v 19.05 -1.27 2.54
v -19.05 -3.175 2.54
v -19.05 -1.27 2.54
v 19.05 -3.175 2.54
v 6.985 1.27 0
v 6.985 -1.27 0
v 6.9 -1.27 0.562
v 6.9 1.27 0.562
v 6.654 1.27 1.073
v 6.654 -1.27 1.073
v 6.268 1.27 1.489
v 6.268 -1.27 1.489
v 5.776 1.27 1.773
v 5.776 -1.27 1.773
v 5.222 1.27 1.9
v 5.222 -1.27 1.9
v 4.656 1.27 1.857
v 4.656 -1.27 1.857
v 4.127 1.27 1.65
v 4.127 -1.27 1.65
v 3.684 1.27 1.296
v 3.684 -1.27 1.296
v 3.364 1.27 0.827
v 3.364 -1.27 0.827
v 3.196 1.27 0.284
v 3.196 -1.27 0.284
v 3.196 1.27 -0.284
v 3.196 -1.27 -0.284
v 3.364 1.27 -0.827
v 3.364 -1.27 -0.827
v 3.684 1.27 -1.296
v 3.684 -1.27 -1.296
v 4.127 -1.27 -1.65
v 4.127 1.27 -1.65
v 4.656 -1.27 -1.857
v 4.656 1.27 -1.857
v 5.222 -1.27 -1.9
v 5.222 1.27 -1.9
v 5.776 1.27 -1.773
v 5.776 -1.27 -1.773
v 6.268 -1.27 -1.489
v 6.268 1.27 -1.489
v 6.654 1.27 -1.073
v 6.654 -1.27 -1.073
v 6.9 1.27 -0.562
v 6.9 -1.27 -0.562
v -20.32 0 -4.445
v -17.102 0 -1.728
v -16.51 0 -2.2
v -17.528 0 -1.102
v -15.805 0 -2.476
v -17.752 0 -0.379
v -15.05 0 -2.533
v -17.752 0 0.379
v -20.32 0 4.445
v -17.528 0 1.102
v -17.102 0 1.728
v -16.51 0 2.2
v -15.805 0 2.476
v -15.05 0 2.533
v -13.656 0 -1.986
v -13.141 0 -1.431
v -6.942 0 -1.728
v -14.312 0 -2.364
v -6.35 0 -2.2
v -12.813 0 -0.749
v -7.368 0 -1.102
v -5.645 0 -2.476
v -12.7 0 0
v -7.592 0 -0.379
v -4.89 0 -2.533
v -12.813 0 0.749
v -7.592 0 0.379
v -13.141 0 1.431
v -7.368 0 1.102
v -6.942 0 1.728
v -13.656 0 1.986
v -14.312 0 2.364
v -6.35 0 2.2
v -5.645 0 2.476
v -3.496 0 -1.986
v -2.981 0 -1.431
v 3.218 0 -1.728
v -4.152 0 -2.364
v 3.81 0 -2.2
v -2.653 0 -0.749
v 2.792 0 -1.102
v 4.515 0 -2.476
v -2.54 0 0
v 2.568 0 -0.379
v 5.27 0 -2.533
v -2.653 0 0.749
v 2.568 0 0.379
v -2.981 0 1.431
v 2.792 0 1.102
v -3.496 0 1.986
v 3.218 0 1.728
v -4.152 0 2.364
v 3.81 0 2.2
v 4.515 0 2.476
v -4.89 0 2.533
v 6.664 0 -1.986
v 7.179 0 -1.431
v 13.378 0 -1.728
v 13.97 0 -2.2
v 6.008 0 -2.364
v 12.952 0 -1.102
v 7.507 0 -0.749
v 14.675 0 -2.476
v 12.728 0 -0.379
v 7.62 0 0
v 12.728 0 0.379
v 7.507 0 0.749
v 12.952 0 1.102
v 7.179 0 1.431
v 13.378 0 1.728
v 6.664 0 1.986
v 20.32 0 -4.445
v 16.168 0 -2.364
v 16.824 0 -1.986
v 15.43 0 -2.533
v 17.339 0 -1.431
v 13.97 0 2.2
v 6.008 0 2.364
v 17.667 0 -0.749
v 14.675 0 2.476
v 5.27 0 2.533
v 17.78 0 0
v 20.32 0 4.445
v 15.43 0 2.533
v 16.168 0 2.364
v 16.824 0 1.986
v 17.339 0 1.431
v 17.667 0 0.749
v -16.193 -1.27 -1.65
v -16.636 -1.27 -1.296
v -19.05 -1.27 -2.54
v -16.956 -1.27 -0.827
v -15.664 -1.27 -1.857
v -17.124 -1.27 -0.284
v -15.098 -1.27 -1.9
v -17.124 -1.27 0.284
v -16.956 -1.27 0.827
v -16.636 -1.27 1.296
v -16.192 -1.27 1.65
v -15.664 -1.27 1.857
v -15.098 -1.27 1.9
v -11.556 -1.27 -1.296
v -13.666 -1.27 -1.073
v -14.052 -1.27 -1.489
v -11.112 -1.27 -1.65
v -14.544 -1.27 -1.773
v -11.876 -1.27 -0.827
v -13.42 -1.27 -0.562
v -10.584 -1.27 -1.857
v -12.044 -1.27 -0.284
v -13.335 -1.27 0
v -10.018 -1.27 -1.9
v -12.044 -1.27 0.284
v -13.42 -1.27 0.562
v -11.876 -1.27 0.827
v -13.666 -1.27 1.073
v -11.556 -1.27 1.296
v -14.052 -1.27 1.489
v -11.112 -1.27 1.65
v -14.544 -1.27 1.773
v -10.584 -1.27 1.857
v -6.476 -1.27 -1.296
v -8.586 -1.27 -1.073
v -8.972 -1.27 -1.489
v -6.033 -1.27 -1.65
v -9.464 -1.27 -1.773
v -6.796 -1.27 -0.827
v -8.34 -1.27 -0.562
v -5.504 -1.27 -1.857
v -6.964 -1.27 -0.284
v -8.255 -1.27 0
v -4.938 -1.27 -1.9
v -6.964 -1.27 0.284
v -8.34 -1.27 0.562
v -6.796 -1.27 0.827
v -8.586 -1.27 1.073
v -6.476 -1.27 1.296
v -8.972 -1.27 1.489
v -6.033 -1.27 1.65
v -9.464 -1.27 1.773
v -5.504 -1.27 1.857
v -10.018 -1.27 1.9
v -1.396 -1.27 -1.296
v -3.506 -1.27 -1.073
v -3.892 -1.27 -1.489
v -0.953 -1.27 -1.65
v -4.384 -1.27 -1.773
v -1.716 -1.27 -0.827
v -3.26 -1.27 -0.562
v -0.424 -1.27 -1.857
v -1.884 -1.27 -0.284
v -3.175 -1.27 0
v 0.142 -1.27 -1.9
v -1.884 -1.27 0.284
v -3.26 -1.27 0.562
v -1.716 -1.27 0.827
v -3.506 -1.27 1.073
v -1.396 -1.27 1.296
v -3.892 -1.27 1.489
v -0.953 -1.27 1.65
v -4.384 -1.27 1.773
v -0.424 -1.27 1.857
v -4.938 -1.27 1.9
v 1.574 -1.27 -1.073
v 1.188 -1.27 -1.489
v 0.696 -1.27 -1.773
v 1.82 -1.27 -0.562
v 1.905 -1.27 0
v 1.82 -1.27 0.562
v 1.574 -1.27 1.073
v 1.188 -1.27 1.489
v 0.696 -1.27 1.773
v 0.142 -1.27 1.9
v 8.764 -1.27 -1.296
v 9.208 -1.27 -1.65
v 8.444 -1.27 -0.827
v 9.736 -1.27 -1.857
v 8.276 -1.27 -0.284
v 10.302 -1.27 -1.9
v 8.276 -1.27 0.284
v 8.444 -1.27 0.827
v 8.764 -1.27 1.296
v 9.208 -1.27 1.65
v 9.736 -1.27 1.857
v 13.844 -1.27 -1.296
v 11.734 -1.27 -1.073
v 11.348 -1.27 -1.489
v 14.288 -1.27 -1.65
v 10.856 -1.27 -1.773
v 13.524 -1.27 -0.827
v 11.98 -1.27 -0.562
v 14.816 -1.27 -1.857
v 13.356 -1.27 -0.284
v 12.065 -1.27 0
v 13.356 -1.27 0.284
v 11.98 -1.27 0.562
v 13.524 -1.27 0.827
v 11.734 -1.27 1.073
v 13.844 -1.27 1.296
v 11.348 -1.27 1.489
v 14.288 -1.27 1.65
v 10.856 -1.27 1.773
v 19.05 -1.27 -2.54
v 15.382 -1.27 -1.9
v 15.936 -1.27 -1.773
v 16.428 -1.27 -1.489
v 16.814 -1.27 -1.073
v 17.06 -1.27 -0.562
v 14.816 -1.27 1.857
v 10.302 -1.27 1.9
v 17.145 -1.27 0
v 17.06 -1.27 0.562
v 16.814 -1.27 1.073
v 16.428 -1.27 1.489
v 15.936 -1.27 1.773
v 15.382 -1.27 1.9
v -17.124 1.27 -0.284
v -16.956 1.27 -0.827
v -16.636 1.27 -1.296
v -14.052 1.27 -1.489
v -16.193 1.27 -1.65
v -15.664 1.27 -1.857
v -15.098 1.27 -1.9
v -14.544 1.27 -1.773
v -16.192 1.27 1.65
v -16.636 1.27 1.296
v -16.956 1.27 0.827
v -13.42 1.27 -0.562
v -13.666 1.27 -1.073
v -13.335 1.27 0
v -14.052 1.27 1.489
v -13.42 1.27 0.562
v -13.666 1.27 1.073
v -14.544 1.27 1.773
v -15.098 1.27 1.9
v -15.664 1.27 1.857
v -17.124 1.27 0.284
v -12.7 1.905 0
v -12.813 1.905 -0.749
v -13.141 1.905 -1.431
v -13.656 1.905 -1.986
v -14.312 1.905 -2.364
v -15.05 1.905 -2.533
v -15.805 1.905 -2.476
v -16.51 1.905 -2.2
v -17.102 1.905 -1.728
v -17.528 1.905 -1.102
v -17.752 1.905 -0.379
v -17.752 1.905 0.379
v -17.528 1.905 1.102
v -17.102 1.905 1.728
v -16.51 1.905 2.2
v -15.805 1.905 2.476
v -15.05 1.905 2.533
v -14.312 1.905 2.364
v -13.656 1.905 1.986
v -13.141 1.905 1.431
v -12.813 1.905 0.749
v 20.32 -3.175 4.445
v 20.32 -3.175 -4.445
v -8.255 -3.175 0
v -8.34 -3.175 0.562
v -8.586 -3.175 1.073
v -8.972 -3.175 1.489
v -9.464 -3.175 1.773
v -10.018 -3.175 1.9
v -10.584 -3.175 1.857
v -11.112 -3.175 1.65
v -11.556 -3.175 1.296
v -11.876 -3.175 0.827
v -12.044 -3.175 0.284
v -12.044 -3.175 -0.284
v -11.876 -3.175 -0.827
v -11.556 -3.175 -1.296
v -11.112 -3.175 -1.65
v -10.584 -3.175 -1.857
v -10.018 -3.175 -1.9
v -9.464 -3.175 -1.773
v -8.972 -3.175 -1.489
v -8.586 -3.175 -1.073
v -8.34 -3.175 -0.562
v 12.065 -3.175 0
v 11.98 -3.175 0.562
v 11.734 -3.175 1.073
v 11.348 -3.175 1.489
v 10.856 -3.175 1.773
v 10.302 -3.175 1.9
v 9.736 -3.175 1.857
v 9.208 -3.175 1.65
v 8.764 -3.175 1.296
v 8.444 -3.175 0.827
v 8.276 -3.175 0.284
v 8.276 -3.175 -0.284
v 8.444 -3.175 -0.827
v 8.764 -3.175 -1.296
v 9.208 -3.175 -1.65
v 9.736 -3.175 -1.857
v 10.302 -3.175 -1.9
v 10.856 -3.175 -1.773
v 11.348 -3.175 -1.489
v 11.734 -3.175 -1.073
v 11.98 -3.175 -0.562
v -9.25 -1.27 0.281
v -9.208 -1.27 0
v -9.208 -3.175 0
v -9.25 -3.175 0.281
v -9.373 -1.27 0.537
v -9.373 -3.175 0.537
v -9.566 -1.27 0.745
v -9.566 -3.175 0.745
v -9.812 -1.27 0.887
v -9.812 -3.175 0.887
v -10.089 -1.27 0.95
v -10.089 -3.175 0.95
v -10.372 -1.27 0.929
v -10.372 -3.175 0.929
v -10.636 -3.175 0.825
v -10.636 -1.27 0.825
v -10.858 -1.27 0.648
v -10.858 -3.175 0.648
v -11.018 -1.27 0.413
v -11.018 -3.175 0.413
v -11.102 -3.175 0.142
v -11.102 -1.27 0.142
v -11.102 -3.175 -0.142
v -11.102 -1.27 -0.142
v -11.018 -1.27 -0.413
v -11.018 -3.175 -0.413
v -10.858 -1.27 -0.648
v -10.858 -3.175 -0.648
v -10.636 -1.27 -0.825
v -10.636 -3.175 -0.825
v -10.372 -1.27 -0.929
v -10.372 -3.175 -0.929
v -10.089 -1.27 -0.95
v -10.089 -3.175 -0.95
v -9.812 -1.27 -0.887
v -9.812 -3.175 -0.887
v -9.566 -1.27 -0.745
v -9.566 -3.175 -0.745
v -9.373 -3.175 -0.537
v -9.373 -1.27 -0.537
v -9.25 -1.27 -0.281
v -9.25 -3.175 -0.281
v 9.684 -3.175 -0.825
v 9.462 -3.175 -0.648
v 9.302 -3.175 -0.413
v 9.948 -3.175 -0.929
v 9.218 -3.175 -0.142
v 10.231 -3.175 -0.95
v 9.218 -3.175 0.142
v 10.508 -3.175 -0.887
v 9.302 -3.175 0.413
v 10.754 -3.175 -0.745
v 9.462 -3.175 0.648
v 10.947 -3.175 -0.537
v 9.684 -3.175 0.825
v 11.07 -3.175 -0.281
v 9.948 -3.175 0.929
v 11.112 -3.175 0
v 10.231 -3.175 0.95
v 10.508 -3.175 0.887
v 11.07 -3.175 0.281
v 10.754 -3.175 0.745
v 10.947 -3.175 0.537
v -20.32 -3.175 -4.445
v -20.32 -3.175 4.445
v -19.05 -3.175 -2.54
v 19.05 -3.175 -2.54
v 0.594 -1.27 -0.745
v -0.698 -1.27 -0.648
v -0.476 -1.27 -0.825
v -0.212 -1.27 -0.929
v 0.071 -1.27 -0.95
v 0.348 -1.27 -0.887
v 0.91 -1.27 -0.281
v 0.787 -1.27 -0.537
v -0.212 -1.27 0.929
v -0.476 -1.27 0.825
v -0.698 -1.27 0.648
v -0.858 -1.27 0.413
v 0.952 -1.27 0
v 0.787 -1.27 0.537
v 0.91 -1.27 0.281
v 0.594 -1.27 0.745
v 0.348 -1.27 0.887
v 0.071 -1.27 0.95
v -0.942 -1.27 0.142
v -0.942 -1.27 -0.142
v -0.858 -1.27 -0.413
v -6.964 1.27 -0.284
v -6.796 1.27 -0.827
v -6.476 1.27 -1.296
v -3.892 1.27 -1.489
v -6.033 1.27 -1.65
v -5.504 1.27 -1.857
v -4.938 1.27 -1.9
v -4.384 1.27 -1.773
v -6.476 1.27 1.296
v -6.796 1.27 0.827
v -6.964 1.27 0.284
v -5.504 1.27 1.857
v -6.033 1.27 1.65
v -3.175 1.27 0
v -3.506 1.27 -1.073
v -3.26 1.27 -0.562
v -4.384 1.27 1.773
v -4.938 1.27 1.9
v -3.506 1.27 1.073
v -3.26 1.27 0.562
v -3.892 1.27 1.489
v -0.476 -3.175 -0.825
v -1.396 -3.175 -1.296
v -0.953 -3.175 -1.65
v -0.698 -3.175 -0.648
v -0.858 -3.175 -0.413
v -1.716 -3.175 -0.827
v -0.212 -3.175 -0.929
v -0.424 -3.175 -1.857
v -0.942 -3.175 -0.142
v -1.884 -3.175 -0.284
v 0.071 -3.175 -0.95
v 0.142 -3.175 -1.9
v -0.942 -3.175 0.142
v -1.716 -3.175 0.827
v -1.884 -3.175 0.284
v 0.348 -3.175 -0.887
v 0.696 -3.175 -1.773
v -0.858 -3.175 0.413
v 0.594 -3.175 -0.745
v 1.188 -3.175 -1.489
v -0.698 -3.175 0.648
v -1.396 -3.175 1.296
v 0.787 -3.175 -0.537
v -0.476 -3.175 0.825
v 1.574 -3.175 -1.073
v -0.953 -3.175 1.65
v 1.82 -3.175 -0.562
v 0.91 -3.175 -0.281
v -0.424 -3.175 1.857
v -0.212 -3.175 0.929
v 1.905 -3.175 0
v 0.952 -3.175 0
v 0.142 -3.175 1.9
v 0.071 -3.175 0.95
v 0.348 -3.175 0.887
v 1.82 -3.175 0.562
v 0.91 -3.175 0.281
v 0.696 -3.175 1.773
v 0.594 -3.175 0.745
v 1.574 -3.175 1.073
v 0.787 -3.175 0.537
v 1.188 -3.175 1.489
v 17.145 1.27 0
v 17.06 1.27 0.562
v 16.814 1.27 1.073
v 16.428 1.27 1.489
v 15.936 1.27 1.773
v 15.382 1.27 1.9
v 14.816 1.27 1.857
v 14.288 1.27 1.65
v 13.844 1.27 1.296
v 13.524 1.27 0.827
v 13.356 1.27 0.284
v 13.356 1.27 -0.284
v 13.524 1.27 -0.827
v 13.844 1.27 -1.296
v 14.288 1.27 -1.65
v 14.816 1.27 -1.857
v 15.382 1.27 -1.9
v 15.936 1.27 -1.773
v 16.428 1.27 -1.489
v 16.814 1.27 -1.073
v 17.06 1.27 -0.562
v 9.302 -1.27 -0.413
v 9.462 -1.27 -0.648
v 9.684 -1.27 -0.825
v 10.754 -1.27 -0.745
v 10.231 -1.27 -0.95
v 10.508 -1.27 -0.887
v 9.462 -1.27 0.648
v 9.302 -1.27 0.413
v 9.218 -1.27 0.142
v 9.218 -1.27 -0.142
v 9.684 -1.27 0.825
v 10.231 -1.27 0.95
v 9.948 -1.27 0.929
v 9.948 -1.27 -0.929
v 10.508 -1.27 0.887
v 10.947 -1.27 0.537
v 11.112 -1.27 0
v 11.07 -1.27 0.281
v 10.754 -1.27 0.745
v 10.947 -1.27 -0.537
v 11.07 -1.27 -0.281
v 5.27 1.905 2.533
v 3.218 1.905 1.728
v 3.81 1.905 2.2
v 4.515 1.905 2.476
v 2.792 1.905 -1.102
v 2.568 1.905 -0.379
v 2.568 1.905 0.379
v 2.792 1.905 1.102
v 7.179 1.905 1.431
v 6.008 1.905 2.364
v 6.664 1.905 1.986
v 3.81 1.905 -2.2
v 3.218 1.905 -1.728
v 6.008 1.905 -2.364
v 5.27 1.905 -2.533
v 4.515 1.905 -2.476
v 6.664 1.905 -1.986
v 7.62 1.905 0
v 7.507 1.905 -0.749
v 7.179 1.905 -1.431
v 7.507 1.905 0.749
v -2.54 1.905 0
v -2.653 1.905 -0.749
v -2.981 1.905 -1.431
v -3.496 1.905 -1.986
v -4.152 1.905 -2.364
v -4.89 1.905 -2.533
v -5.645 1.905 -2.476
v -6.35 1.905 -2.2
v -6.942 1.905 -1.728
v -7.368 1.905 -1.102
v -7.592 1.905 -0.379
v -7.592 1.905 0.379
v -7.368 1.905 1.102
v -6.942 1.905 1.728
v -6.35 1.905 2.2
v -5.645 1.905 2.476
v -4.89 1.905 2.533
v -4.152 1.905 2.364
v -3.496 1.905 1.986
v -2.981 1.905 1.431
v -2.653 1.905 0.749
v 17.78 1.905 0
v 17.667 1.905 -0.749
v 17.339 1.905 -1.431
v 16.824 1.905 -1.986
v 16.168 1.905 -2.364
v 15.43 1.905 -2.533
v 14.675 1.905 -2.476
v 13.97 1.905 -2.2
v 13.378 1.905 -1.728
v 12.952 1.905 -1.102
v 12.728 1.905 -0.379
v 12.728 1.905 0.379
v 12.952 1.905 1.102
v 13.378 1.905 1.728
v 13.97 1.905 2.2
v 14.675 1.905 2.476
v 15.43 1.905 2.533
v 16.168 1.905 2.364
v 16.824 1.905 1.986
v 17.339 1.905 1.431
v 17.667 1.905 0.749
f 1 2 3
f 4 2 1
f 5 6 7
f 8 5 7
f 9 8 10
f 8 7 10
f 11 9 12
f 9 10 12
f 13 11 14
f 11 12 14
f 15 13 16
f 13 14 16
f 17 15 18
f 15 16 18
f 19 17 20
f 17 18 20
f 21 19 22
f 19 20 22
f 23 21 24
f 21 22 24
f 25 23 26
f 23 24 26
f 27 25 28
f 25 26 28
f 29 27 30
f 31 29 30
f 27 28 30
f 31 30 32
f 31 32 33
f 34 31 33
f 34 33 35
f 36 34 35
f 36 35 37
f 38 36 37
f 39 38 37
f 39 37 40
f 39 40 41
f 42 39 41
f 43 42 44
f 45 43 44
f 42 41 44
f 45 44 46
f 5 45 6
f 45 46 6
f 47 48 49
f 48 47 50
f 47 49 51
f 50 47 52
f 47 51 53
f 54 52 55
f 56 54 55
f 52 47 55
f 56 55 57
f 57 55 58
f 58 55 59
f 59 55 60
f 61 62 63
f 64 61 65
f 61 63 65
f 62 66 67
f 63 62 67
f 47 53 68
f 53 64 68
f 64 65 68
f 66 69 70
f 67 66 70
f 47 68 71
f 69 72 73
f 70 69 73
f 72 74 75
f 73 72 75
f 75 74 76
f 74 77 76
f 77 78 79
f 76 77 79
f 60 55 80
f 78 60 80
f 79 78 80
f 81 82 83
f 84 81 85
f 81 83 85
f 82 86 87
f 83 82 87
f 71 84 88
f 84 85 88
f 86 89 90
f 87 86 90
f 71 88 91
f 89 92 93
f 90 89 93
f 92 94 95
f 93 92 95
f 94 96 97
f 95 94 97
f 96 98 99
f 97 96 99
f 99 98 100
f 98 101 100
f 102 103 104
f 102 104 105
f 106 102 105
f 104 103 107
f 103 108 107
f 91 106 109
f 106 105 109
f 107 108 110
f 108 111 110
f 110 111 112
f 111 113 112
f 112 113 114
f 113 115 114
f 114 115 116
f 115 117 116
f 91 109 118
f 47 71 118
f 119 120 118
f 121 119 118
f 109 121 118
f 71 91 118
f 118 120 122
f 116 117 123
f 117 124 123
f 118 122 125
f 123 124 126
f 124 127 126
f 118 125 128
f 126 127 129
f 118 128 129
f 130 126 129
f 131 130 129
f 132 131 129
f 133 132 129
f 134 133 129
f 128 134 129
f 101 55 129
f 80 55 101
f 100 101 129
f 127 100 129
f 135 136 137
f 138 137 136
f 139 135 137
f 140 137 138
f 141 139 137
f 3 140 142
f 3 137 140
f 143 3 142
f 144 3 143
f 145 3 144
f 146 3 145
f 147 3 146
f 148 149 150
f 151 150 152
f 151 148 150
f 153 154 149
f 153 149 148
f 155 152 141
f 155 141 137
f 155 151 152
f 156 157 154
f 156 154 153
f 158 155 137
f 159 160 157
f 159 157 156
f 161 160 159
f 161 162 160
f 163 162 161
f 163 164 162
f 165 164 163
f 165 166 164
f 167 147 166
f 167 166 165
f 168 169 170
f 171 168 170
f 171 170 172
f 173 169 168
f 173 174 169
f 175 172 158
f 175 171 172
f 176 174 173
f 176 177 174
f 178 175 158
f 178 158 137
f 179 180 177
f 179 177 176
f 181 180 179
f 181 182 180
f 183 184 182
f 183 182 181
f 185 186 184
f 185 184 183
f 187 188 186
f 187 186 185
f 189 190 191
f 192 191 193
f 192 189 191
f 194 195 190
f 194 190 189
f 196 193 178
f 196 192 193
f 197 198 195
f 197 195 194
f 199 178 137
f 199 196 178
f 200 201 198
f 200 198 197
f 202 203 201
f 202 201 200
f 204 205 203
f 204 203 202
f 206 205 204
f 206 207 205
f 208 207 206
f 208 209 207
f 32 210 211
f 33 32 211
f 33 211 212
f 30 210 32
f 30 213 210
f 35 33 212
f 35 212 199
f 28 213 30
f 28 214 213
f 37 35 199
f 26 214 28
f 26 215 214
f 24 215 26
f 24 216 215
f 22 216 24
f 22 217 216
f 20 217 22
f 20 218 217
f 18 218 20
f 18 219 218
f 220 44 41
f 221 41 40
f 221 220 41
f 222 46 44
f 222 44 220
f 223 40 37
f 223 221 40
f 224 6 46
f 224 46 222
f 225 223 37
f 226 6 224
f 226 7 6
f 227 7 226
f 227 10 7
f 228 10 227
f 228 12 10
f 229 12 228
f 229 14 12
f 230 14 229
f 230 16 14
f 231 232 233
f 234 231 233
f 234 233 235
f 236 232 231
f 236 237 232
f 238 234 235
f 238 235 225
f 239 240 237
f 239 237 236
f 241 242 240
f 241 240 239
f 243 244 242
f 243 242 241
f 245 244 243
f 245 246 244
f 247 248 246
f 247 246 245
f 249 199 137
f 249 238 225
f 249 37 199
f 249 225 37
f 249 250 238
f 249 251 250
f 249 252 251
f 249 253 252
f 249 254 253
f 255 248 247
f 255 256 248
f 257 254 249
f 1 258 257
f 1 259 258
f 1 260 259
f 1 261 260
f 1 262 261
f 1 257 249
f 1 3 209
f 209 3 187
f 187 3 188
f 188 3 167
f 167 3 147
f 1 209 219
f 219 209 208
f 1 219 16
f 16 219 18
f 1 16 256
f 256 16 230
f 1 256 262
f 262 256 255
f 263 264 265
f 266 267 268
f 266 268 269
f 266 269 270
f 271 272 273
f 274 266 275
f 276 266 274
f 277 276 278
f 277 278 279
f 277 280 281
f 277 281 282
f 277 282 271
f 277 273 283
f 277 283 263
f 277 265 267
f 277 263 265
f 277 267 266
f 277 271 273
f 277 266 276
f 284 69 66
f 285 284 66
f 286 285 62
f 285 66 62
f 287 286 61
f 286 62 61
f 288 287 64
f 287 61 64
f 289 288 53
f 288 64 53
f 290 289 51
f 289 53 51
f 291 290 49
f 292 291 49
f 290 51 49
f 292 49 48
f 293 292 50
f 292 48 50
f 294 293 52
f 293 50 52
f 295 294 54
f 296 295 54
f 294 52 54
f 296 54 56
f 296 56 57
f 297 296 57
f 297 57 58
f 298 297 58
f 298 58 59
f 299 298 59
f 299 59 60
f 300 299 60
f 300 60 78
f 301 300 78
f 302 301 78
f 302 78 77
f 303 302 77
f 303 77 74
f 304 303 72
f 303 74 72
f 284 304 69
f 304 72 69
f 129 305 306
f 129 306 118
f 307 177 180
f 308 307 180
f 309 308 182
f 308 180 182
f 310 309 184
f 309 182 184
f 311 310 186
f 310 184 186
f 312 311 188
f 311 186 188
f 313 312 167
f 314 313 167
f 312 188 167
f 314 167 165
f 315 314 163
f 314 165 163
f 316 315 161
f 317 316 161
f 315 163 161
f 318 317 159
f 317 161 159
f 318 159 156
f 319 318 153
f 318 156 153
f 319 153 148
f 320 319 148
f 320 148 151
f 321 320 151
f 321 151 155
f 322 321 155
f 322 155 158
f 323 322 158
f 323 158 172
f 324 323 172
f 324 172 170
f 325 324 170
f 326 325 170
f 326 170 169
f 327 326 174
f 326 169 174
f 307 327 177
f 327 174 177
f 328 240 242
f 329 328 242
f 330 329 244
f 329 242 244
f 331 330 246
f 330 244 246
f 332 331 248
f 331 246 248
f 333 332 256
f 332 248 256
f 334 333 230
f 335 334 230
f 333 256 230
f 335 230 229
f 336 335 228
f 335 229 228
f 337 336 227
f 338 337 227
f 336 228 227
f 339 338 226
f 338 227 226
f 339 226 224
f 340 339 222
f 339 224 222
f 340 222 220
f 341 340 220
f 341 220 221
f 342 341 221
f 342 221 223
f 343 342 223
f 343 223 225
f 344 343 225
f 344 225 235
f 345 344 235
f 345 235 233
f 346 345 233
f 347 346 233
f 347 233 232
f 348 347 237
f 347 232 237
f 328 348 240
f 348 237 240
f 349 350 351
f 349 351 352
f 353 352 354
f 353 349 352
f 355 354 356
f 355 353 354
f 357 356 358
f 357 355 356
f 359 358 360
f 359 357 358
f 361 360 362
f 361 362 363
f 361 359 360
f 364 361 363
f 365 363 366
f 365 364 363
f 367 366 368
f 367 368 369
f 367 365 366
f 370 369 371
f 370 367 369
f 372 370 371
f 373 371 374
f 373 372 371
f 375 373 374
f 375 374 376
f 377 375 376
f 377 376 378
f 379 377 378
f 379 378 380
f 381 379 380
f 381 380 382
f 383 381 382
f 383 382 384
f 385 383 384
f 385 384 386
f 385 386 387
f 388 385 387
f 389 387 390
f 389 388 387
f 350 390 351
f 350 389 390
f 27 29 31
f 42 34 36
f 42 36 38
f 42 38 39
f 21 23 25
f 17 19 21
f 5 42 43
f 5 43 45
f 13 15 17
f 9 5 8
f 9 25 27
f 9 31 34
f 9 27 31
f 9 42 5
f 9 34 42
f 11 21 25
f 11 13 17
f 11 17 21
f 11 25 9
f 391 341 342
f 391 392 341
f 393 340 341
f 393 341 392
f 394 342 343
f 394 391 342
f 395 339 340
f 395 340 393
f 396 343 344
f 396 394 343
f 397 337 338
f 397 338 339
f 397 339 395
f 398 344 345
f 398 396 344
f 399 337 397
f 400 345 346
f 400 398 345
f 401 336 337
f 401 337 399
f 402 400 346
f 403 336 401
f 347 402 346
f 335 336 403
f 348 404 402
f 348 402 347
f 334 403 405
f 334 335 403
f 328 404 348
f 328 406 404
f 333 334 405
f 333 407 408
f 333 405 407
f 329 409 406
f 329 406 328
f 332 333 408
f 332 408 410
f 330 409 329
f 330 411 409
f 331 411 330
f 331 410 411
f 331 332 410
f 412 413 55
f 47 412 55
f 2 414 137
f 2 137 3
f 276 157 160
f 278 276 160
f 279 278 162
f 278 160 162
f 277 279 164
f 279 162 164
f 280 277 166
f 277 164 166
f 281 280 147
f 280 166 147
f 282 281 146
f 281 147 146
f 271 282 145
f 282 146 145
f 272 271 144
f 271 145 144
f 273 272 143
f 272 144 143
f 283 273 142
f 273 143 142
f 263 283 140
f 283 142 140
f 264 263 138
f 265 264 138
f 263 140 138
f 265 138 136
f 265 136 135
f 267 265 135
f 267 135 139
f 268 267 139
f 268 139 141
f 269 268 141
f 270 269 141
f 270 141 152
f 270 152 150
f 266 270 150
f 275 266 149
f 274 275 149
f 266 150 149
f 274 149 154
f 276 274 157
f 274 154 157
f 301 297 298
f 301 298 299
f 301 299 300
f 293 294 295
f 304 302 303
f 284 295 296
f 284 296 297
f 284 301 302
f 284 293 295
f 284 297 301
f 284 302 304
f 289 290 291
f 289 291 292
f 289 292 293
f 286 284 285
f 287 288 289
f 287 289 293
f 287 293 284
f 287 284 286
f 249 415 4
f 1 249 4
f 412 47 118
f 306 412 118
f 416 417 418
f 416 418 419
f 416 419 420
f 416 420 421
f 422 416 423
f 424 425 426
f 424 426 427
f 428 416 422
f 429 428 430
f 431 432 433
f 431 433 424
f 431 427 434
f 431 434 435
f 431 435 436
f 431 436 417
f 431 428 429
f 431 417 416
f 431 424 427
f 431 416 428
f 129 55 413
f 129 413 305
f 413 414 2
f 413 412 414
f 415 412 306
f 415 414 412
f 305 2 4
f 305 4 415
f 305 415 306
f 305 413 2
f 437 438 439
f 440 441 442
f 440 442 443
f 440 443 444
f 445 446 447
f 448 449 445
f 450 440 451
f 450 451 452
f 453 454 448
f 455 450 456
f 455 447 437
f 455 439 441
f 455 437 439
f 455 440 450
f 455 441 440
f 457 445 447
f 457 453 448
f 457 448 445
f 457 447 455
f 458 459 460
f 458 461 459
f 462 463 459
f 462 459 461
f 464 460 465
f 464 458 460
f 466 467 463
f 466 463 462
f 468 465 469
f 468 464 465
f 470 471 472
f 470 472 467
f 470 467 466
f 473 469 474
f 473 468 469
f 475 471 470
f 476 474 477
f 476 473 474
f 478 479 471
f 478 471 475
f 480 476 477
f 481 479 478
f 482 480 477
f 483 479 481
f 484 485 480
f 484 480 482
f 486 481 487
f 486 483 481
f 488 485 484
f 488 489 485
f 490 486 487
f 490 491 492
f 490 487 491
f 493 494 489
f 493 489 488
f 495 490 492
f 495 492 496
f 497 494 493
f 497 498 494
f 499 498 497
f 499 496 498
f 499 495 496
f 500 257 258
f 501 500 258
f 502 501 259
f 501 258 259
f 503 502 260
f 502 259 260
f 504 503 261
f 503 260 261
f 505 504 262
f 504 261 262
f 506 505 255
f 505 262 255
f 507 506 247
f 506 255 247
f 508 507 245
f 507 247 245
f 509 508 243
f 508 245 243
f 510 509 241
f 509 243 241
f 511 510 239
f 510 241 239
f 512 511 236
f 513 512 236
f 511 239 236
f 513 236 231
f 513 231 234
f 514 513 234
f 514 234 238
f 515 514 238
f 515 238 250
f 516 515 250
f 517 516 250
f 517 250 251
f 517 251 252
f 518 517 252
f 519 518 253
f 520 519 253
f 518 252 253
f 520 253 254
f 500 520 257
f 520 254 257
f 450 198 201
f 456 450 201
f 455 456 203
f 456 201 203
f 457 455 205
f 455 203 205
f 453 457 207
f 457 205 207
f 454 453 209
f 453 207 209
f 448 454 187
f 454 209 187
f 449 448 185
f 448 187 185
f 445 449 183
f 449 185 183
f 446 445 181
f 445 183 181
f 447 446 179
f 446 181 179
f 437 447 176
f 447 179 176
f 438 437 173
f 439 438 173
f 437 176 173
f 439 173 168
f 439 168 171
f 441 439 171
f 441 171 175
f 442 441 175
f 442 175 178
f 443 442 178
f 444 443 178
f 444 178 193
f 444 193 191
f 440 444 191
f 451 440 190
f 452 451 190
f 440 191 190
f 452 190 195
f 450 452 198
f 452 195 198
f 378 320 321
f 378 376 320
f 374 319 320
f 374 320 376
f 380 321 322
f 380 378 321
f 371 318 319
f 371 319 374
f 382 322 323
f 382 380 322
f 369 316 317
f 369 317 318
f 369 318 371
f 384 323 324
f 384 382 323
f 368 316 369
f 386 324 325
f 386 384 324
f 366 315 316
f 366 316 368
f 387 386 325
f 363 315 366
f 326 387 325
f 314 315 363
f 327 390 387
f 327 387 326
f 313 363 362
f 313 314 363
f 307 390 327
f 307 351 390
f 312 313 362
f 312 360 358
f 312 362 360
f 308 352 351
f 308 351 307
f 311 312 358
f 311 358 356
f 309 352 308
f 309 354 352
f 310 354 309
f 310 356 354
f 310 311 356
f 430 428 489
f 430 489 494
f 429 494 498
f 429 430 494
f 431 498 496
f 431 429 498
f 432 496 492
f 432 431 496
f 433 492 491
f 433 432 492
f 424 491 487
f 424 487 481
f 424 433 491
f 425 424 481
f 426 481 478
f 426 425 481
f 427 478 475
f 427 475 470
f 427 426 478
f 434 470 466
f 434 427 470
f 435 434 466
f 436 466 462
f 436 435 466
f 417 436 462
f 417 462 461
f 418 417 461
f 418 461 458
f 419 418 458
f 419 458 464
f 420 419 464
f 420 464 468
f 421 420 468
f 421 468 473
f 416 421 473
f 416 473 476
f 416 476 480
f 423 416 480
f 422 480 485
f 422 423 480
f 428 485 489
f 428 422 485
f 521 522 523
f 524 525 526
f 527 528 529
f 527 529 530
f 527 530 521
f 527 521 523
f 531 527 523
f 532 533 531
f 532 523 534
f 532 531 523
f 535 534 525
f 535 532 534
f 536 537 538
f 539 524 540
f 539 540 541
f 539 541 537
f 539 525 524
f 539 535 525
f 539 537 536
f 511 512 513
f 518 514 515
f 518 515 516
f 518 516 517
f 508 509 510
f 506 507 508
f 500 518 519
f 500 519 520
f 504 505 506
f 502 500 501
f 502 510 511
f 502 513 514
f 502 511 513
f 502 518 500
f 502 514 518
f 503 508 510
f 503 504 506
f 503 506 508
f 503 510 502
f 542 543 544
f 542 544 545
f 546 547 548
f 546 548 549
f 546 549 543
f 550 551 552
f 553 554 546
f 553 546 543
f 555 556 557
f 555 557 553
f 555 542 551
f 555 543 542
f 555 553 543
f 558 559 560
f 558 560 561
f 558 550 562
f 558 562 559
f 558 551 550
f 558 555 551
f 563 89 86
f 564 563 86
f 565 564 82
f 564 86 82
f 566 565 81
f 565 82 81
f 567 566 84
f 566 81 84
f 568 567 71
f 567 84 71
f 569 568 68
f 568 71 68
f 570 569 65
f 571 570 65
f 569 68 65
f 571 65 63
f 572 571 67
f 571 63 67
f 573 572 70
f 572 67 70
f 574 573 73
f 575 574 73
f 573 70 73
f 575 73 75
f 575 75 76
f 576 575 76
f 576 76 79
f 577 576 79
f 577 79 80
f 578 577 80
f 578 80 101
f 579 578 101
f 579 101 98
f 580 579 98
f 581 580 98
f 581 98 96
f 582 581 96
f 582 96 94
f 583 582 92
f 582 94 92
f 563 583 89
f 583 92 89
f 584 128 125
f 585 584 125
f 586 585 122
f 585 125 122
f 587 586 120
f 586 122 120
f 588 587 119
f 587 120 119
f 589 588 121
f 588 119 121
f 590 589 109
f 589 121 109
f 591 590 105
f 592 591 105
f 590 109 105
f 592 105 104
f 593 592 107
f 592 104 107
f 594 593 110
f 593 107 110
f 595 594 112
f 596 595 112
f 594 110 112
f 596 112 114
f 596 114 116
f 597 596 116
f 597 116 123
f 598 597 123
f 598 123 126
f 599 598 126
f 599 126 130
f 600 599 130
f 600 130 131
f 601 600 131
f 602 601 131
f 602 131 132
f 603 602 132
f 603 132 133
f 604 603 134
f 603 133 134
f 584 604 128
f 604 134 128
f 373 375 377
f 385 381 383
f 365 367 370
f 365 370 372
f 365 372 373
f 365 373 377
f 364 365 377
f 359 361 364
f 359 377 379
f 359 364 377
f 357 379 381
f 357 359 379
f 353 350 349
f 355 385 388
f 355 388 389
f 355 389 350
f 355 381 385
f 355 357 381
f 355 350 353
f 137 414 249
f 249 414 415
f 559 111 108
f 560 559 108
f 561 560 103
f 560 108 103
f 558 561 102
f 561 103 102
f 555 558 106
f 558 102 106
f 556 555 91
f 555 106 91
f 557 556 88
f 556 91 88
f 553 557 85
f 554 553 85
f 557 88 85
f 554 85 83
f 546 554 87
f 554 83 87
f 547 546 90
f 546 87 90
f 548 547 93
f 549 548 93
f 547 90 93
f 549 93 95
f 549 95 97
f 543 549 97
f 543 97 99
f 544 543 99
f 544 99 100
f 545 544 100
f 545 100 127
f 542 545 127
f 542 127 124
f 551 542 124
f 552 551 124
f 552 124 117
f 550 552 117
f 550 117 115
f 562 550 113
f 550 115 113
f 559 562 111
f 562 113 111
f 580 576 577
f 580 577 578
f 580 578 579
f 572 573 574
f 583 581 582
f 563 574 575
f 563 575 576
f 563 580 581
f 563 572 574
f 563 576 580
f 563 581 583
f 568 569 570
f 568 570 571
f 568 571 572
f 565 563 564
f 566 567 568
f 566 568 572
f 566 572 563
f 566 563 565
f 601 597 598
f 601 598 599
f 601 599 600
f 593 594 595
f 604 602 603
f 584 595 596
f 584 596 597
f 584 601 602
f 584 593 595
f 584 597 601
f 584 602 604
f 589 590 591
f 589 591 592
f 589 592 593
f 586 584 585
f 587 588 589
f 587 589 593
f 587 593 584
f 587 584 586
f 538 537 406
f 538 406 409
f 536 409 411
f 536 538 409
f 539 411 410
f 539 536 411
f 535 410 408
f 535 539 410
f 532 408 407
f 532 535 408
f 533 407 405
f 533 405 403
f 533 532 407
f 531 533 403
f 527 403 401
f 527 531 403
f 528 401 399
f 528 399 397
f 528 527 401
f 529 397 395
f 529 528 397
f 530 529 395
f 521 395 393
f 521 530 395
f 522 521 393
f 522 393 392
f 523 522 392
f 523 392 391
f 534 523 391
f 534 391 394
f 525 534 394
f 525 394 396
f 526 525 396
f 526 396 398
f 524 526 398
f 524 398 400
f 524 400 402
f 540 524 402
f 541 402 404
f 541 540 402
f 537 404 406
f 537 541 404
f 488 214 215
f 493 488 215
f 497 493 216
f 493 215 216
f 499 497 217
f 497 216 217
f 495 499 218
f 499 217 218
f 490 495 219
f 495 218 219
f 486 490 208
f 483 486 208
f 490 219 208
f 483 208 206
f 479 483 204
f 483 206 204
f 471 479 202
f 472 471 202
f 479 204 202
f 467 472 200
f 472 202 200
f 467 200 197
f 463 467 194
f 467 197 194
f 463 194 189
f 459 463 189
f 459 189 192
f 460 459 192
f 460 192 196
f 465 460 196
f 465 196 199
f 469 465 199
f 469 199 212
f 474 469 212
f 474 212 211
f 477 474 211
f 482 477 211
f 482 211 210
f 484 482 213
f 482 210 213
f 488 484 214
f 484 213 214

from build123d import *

# Parameters (mm, degrees)
SKETCH1_W           = 40.64
SKETCH1_H           = 3.175
BOSS_EXTRUDE1_DEPTH = 4.445
SKETCH2_R           = 2.54
BOSS_EXTRUDE2_DEPTH = 1.905
SKETCH3_W           = 38.1
SKETCH3_H           = 5.08
CUT_EXTRUDE1_DEPTH  = 1.905
SKETCH4_R           = 1.905
CUT_EXTRUDE2_DEPTH  = 2.54
SKETCH5_R           = 1.905
SKETCH5_R_2         = 0.9525
BOSS_EXTRUDE3_DEPTH = 1.905


with BuildPart() as part:
    # Sketch1 → Boss-Extrude1 (new body, symmetric)
    with BuildSketch(Plane.XY):
        with Locations((0, -1.5875)):
            Rectangle(SKETCH1_W, SKETCH1_H)
    extrude(amount=BOSS_EXTRUDE1_DEPTH, both=True)

    # Sketch2 → Boss-Extrude2 (add)
    with BuildSketch(Plane(origin=(0, 0, 0), x_dir=(1, 0, 0), z_dir=(0, 1, 0))):
        with Locations((-15.24, 0)):
            Circle(SKETCH2_R)
        with Locations((-5.08, 0)):
            Circle(SKETCH2_R)
        with Locations((5.08, 0)):
            Circle(SKETCH2_R)
        with Locations((15.24, 0)):
            Circle(SKETCH2_R)
    extrude(amount=BOSS_EXTRUDE2_DEPTH)

    # Sketch3 → Cut-Extrude1 (cut)
    with BuildSketch(Plane.XZ.offset(3.175)):
        Rectangle(SKETCH3_W, SKETCH3_H)
    extrude(amount=-CUT_EXTRUDE1_DEPTH, mode=Mode.SUBTRACT)

    # Sketch4 → Cut-Extrude2 (cut)
    with BuildSketch(Plane.XZ.offset(1.27)):
        with Locations((-15.24, 0)):
            Circle(SKETCH4_R)
        with Locations((-5.08, 0)):
            Circle(SKETCH4_R)
        with Locations((5.08, 0)):
            Circle(SKETCH4_R)
        with Locations((15.24, 0)):
            Circle(SKETCH4_R)
    extrude(amount=-CUT_EXTRUDE2_DEPTH, mode=Mode.SUBTRACT)

    # Sketch5 → Boss-Extrude3 (add)
    with BuildSketch(Plane.XZ.offset(1.27)):
        with Locations((-10.16, 0)):
            Circle(SKETCH5_R)
        with Locations((-10.16, 0)):
            Circle(SKETCH5_R_2, mode=Mode.SUBTRACT)
        with Locations((10.16, 0)):
            Circle(SKETCH5_R)
        with Locations((10.16, 0)):
            Circle(SKETCH5_R_2, mode=Mode.SUBTRACT)
        Circle(SKETCH5_R)
        Circle(SKETCH5_R_2, mode=Mode.SUBTRACT)
    extrude(amount=BOSS_EXTRUDE3_DEPTH)


solid = part.part
